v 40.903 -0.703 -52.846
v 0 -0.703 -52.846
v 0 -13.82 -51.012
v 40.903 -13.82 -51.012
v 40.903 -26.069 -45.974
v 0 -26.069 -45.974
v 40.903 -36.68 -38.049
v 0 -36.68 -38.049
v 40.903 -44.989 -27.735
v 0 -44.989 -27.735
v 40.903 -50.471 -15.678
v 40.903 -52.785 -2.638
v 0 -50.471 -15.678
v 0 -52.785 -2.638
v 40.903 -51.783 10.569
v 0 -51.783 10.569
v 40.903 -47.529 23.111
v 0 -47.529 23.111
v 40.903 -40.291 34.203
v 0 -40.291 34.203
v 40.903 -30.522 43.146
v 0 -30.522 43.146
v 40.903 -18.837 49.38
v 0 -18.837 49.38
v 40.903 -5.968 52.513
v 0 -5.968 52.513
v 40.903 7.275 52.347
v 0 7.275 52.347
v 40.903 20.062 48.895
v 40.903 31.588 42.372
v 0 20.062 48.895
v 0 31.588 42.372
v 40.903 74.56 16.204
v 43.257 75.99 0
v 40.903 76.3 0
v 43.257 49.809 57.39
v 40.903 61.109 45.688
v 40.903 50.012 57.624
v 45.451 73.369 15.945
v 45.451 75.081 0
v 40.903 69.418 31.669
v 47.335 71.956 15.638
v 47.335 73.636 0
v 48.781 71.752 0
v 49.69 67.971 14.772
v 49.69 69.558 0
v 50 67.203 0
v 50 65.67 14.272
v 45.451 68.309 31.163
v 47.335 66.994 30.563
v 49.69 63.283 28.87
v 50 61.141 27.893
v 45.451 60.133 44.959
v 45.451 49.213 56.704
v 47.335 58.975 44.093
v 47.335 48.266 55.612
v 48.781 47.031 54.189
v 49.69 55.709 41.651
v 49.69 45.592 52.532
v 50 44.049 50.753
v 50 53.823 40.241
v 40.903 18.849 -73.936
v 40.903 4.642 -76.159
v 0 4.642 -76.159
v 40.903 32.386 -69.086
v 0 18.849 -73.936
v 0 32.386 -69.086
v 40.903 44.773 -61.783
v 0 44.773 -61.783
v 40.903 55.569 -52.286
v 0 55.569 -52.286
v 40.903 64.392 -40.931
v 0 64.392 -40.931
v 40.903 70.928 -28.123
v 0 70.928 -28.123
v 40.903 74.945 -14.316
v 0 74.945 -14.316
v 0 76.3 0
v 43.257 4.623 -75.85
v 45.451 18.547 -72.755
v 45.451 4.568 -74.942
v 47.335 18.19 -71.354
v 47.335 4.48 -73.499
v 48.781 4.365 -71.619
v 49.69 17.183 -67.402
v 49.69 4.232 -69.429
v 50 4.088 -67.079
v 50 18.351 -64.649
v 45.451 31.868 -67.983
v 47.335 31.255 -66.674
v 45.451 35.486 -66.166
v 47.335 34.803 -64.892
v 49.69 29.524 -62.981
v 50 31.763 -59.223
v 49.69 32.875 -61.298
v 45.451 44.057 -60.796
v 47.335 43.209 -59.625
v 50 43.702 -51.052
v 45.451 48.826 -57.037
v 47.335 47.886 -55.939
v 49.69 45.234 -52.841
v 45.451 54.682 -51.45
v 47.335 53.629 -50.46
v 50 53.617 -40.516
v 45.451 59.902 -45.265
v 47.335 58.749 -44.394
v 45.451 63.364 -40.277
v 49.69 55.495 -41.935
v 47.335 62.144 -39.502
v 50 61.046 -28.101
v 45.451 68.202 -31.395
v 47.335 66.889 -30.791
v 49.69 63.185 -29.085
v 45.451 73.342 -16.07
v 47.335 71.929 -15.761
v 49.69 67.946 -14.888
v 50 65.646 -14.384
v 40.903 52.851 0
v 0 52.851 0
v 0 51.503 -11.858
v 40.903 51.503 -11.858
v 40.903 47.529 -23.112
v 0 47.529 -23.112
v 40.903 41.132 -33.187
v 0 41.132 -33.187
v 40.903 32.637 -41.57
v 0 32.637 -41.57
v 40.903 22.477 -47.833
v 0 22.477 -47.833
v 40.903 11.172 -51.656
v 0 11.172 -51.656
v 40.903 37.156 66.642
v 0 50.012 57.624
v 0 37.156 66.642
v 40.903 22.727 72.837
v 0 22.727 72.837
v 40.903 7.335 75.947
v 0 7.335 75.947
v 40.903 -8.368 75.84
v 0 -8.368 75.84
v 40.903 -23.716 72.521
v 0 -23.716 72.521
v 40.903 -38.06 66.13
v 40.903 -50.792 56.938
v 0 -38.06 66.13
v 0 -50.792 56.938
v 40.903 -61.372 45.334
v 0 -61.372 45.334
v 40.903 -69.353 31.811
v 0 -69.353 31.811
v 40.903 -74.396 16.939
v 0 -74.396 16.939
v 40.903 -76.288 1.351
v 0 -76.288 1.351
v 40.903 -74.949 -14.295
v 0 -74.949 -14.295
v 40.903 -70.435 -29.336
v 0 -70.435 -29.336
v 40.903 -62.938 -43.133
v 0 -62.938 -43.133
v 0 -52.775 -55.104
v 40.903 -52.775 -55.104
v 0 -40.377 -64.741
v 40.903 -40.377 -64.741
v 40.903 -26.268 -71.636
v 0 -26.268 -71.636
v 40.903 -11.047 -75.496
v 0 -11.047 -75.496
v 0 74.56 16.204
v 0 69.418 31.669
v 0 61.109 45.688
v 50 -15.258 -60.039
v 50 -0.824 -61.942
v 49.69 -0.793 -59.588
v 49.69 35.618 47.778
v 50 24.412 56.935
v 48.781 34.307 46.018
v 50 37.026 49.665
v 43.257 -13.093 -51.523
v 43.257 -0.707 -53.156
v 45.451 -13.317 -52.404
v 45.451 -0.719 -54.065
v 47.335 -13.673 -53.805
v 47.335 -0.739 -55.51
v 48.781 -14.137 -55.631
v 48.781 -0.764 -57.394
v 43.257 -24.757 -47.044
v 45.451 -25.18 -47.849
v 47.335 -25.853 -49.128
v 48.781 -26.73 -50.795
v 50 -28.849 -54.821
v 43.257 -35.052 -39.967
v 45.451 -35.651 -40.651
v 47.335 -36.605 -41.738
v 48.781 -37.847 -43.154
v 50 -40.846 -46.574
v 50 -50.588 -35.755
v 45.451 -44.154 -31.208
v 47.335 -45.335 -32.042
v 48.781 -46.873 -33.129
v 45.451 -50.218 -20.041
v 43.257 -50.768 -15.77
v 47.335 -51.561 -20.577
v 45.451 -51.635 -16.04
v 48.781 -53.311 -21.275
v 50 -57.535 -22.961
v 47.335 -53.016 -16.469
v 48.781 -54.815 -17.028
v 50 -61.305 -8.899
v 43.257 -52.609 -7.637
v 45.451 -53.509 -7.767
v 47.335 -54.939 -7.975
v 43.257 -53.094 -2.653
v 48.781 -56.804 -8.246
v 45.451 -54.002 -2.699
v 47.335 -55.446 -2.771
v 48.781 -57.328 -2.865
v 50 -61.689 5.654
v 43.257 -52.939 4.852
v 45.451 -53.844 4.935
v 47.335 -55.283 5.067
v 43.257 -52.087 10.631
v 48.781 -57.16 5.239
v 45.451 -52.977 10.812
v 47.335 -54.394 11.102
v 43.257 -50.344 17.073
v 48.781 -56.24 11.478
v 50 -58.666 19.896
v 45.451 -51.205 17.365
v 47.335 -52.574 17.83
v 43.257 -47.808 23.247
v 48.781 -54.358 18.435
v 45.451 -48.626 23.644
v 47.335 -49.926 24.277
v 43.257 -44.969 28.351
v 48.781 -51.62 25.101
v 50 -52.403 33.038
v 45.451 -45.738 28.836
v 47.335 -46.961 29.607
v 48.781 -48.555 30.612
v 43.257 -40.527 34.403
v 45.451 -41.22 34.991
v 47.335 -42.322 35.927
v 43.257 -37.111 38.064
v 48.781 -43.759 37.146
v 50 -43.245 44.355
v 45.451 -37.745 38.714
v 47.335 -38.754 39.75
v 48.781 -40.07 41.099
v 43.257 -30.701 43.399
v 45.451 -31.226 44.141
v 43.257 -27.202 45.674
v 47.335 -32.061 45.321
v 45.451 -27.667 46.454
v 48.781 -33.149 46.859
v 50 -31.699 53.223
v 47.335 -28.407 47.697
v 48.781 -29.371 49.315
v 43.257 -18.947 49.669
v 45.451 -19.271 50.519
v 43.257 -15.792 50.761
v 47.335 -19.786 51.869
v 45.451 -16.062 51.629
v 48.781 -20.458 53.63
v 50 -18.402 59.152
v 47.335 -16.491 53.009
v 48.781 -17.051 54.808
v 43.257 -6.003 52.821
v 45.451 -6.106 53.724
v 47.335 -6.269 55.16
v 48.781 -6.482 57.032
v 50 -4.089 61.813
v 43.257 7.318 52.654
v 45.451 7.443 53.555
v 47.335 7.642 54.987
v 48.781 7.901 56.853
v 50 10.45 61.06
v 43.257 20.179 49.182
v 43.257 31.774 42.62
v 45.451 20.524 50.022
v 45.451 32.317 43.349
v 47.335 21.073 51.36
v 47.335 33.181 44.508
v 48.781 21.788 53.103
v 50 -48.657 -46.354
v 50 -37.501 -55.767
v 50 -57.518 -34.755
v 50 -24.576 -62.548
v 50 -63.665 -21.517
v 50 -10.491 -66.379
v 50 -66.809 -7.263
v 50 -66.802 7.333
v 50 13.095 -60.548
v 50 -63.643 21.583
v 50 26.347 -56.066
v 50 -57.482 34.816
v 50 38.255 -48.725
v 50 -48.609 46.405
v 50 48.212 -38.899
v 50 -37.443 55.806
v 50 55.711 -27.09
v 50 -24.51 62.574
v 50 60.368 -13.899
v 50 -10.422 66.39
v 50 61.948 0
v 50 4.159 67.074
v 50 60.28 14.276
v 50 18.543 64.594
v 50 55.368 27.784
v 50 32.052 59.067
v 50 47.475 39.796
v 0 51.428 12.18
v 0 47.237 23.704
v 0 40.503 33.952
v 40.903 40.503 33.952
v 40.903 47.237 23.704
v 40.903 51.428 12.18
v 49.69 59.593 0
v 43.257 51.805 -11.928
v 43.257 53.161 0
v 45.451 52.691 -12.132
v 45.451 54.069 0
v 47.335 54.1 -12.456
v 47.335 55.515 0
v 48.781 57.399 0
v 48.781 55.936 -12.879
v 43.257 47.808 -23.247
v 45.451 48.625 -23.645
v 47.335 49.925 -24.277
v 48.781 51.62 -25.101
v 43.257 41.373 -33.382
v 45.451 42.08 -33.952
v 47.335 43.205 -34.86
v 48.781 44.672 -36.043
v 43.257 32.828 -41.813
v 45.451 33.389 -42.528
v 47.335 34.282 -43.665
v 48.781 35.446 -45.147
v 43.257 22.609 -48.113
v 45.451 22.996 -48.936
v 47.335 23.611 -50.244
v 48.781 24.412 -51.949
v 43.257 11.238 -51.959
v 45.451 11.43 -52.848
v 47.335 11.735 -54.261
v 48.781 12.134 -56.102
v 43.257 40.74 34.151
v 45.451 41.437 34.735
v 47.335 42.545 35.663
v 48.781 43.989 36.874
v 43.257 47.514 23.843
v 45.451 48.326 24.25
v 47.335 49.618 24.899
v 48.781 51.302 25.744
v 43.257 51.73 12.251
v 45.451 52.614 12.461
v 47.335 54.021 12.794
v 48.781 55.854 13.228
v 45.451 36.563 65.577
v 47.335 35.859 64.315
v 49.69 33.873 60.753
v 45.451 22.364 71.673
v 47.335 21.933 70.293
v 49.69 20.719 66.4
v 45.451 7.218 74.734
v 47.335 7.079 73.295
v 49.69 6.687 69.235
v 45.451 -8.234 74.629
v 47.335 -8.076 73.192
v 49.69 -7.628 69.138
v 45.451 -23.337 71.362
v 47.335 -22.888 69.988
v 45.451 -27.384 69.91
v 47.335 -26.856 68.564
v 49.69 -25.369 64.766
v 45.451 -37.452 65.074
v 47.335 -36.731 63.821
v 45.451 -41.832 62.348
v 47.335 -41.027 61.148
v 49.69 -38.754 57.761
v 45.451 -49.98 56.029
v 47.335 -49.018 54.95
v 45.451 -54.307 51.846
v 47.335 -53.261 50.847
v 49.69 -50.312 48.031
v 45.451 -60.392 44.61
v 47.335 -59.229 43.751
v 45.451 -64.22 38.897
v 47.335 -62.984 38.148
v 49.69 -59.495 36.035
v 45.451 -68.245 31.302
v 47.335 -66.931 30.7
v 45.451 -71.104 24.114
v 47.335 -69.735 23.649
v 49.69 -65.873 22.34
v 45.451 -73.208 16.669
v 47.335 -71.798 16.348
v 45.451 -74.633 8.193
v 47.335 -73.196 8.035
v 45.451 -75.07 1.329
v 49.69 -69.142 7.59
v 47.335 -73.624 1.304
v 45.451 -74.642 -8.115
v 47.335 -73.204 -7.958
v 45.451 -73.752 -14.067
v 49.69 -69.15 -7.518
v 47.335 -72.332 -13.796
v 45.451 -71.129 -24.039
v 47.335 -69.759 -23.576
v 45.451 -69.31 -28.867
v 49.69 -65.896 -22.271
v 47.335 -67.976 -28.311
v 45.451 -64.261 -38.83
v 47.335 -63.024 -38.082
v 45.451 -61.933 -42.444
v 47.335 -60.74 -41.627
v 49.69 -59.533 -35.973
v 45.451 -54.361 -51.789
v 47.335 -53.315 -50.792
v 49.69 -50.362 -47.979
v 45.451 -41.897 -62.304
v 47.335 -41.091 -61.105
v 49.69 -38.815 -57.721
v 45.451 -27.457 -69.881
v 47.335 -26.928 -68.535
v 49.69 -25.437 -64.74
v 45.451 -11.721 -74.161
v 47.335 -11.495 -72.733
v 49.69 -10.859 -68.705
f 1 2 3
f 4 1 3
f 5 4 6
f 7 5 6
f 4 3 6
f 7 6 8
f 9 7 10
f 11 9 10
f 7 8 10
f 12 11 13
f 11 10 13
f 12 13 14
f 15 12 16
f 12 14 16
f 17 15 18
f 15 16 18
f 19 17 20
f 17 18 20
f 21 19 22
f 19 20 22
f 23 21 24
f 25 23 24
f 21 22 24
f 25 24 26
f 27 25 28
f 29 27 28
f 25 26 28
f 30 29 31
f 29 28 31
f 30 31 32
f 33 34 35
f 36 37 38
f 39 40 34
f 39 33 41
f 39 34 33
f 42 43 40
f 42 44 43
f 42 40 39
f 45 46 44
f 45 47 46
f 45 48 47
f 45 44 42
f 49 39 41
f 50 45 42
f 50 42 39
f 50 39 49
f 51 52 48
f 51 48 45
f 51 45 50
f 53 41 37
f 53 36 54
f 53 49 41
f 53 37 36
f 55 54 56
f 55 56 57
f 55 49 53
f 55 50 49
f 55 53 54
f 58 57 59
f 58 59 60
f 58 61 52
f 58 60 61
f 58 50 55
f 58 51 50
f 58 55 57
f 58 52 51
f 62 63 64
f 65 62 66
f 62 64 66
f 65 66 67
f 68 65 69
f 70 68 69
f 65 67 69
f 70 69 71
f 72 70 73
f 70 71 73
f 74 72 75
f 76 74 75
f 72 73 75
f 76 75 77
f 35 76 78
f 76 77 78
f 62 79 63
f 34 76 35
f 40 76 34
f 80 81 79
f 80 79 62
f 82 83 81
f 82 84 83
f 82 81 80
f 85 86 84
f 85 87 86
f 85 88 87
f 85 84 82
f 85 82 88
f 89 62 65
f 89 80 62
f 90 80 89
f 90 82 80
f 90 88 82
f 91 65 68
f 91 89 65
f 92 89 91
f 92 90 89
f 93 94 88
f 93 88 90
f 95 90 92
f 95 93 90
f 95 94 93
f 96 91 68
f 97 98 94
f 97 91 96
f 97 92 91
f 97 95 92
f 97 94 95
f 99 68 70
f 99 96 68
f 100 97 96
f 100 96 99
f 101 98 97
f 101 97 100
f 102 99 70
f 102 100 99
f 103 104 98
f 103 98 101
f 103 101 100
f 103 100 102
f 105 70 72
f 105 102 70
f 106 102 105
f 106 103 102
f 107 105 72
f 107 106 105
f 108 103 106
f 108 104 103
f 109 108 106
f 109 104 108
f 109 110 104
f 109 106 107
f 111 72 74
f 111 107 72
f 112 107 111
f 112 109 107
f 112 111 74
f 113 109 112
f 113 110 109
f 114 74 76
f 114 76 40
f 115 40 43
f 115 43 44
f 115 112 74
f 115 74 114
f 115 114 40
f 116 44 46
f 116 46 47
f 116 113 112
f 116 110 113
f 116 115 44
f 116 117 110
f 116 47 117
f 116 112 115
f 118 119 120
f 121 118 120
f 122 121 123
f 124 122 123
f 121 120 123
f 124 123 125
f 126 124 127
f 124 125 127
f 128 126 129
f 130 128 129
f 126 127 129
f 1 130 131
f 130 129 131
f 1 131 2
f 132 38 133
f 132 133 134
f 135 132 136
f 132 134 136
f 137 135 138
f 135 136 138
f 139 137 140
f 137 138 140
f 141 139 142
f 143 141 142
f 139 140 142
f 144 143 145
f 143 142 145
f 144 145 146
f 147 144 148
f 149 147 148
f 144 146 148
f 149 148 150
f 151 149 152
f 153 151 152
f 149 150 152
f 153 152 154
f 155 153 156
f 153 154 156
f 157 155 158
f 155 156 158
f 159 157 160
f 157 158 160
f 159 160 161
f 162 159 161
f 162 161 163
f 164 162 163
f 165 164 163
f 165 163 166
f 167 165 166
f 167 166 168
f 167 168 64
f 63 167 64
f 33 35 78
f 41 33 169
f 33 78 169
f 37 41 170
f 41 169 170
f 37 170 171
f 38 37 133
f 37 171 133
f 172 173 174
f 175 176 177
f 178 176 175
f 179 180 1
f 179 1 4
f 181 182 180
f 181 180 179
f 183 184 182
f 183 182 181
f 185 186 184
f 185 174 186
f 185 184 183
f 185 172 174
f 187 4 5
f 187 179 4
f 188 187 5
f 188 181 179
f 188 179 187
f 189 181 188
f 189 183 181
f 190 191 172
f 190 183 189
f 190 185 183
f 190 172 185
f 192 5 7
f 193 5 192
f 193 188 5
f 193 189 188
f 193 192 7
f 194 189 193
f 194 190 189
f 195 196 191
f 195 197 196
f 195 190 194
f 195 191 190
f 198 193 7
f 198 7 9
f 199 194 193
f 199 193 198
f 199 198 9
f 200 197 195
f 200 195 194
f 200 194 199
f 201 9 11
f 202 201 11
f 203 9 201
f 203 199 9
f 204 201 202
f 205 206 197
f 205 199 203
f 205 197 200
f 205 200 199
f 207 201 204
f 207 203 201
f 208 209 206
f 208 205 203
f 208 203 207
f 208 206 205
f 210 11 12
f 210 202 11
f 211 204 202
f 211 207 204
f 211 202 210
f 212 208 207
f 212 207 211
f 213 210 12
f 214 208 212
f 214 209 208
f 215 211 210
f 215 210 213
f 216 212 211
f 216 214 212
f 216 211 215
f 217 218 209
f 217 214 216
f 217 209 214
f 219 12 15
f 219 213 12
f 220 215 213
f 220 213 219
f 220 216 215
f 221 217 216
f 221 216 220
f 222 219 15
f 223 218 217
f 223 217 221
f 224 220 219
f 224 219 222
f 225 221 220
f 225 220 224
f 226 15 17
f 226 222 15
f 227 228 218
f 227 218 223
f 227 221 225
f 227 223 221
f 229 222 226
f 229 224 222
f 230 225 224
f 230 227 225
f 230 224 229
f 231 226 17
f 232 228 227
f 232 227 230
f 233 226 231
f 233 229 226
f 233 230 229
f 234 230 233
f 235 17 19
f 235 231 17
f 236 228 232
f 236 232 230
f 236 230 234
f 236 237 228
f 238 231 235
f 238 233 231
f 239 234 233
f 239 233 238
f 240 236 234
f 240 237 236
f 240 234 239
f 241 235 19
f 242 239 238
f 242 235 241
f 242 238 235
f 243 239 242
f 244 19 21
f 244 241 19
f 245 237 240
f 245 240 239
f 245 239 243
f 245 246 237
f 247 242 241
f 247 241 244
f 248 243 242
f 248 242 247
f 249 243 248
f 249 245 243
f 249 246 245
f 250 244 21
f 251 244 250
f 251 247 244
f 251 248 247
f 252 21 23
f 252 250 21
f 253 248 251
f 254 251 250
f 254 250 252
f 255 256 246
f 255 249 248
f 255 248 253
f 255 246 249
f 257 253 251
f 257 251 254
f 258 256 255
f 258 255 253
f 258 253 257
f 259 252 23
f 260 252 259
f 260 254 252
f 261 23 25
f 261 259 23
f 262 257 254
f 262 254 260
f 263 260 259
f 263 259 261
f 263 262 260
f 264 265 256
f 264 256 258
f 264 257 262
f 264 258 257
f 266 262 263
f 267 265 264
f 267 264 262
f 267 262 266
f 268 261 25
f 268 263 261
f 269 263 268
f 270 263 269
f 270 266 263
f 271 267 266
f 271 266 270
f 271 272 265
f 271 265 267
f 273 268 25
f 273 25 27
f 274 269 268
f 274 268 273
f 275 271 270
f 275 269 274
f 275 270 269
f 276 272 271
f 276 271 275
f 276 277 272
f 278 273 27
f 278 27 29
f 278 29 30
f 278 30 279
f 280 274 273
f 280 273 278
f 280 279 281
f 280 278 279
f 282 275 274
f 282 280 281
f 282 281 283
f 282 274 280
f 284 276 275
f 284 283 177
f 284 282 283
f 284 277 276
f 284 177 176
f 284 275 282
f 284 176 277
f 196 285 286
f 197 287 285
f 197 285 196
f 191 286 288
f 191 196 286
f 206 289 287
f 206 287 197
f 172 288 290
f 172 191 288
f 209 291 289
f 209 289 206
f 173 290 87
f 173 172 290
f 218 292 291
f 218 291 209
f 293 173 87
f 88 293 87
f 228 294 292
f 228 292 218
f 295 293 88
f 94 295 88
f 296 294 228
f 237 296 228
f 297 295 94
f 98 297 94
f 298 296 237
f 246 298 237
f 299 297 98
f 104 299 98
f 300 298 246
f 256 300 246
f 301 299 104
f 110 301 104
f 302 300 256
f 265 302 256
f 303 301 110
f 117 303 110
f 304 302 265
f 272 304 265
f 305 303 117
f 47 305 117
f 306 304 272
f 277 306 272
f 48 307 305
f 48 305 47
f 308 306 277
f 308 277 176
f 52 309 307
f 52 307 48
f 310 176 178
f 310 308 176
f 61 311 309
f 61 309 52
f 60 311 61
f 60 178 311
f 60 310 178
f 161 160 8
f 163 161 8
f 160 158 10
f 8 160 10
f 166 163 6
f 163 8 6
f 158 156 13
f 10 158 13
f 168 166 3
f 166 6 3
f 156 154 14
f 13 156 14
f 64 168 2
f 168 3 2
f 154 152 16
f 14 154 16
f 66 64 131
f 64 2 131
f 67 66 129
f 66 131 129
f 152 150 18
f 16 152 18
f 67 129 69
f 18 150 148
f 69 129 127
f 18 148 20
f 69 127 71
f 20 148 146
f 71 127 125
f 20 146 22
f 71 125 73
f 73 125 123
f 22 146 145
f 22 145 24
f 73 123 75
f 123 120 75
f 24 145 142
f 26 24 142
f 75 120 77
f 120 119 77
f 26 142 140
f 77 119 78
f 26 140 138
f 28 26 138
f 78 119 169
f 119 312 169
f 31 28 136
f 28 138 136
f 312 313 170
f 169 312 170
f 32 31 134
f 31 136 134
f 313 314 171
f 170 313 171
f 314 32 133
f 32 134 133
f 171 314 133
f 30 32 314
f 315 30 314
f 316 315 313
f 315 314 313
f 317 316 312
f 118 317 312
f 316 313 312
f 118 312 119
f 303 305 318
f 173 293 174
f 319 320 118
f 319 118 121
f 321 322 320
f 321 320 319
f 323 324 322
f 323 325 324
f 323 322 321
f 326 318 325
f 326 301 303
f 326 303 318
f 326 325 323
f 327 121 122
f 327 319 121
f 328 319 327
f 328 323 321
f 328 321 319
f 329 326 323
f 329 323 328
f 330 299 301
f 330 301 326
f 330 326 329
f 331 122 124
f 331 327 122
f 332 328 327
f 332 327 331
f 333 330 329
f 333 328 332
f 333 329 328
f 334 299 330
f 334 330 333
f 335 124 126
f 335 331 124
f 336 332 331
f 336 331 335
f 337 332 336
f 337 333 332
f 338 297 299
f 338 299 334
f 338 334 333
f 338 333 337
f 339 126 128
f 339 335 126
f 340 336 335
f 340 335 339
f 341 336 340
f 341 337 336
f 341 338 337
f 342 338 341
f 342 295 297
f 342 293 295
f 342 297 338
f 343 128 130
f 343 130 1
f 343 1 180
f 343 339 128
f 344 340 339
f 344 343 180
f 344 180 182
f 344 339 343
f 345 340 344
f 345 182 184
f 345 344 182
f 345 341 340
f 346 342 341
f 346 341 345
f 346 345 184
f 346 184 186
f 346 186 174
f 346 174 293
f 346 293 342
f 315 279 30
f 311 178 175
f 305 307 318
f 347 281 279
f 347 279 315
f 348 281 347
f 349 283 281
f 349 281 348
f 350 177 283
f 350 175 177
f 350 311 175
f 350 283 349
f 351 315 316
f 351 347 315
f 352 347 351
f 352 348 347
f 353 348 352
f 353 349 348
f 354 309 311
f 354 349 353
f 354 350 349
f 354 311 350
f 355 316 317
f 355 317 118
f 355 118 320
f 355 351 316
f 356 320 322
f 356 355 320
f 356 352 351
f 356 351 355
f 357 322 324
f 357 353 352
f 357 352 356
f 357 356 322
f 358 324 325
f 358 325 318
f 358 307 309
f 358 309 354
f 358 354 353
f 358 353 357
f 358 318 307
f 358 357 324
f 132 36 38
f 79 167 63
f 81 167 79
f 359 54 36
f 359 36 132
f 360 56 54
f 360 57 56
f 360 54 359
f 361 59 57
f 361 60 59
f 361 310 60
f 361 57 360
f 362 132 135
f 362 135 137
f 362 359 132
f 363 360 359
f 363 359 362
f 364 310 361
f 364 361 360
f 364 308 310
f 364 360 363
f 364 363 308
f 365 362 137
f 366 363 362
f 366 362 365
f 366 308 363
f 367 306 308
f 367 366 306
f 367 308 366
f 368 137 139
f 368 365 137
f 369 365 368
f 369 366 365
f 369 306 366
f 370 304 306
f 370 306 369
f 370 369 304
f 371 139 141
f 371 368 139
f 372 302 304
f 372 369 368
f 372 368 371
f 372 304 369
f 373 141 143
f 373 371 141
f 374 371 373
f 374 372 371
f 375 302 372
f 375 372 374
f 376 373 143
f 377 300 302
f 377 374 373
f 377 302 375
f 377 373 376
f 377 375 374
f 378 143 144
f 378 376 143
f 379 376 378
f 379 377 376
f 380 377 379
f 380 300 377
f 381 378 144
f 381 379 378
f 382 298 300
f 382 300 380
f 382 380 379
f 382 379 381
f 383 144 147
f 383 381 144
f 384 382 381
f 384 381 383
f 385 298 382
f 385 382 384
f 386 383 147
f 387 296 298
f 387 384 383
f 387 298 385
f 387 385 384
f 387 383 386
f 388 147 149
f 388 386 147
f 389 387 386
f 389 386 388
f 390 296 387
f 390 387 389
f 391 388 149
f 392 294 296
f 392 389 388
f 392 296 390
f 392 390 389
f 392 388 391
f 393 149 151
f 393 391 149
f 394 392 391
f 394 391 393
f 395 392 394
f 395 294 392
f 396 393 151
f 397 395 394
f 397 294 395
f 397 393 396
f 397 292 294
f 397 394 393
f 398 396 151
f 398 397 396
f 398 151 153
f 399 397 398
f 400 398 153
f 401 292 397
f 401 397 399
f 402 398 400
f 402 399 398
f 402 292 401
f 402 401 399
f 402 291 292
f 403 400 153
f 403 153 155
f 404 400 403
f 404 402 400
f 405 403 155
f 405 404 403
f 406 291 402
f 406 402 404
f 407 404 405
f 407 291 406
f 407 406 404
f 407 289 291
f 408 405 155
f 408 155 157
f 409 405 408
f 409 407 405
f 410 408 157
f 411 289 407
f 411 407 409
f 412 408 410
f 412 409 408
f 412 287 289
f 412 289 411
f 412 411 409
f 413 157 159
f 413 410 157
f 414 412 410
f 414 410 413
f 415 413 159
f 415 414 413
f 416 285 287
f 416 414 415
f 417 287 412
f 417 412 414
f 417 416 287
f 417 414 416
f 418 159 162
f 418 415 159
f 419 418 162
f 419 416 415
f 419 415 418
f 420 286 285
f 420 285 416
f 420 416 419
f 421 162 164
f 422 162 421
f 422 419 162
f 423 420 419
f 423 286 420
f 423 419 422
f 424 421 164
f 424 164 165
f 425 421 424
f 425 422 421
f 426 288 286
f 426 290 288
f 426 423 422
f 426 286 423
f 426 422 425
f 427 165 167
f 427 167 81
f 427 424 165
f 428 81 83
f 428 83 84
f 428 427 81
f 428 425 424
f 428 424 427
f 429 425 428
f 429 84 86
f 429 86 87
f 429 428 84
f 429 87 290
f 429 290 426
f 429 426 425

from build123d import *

# Parameters (mm, degrees)
F1_DEPTH = 50
F2_R     = 9.097272


with BuildPart() as f1:
    # F0 (on Right) → F1 (new body)
    with BuildSketch(Plane.YZ):
        with BuildLine():
            ThreePointArc((31.588309, 42.371733), (47.236881, 23.703631), (52.850592, 0))
            ThreePointArc((52.850592, 0), (37.121585, -37.618785), (-0.703132, -52.845914))
            ThreePointArc((-0.703132, -52.845914), (1.366054, -64.640751), (4.641868, -76.158942))
            ThreePointArc((4.641868, -76.158942), (55.569359, -52.285541), (76.300272, 0))
            ThreePointArc((76.300272, 0), (69.417814, 31.668573), (50.012069, 57.623992))
            ThreePointArc((50.012069, 57.623992), (40.405478, 50.474648), (31.588309, 42.371733))
        make_face()
        with BuildLine():
            ThreePointArc((-0.703132, -52.845914), (-50.050711, 16.973845), (31.588309, 42.371733))
            ThreePointArc((31.588309, 42.371733), (40.405478, 50.474648), (50.012069, 57.623992))
            ThreePointArc((50.012069, 57.623992), (-72.25809, 24.505099), (4.641868, -76.158942))
            ThreePointArc((4.641868, -76.158942), (1.366054, -64.640751), (-0.703132, -52.845914))
        make_face()
    extrude(amount=F1_DEPTH)

    # F2
    f2_edges = [f1.edges().sort_by_distance(p)[0] for p in [
        (50, -4.641868, 76.158942),
        (50, -31.588309, -42.371733),
    ]]
    fillet(f2_edges, radius=F2_R)


solid = f1.part
